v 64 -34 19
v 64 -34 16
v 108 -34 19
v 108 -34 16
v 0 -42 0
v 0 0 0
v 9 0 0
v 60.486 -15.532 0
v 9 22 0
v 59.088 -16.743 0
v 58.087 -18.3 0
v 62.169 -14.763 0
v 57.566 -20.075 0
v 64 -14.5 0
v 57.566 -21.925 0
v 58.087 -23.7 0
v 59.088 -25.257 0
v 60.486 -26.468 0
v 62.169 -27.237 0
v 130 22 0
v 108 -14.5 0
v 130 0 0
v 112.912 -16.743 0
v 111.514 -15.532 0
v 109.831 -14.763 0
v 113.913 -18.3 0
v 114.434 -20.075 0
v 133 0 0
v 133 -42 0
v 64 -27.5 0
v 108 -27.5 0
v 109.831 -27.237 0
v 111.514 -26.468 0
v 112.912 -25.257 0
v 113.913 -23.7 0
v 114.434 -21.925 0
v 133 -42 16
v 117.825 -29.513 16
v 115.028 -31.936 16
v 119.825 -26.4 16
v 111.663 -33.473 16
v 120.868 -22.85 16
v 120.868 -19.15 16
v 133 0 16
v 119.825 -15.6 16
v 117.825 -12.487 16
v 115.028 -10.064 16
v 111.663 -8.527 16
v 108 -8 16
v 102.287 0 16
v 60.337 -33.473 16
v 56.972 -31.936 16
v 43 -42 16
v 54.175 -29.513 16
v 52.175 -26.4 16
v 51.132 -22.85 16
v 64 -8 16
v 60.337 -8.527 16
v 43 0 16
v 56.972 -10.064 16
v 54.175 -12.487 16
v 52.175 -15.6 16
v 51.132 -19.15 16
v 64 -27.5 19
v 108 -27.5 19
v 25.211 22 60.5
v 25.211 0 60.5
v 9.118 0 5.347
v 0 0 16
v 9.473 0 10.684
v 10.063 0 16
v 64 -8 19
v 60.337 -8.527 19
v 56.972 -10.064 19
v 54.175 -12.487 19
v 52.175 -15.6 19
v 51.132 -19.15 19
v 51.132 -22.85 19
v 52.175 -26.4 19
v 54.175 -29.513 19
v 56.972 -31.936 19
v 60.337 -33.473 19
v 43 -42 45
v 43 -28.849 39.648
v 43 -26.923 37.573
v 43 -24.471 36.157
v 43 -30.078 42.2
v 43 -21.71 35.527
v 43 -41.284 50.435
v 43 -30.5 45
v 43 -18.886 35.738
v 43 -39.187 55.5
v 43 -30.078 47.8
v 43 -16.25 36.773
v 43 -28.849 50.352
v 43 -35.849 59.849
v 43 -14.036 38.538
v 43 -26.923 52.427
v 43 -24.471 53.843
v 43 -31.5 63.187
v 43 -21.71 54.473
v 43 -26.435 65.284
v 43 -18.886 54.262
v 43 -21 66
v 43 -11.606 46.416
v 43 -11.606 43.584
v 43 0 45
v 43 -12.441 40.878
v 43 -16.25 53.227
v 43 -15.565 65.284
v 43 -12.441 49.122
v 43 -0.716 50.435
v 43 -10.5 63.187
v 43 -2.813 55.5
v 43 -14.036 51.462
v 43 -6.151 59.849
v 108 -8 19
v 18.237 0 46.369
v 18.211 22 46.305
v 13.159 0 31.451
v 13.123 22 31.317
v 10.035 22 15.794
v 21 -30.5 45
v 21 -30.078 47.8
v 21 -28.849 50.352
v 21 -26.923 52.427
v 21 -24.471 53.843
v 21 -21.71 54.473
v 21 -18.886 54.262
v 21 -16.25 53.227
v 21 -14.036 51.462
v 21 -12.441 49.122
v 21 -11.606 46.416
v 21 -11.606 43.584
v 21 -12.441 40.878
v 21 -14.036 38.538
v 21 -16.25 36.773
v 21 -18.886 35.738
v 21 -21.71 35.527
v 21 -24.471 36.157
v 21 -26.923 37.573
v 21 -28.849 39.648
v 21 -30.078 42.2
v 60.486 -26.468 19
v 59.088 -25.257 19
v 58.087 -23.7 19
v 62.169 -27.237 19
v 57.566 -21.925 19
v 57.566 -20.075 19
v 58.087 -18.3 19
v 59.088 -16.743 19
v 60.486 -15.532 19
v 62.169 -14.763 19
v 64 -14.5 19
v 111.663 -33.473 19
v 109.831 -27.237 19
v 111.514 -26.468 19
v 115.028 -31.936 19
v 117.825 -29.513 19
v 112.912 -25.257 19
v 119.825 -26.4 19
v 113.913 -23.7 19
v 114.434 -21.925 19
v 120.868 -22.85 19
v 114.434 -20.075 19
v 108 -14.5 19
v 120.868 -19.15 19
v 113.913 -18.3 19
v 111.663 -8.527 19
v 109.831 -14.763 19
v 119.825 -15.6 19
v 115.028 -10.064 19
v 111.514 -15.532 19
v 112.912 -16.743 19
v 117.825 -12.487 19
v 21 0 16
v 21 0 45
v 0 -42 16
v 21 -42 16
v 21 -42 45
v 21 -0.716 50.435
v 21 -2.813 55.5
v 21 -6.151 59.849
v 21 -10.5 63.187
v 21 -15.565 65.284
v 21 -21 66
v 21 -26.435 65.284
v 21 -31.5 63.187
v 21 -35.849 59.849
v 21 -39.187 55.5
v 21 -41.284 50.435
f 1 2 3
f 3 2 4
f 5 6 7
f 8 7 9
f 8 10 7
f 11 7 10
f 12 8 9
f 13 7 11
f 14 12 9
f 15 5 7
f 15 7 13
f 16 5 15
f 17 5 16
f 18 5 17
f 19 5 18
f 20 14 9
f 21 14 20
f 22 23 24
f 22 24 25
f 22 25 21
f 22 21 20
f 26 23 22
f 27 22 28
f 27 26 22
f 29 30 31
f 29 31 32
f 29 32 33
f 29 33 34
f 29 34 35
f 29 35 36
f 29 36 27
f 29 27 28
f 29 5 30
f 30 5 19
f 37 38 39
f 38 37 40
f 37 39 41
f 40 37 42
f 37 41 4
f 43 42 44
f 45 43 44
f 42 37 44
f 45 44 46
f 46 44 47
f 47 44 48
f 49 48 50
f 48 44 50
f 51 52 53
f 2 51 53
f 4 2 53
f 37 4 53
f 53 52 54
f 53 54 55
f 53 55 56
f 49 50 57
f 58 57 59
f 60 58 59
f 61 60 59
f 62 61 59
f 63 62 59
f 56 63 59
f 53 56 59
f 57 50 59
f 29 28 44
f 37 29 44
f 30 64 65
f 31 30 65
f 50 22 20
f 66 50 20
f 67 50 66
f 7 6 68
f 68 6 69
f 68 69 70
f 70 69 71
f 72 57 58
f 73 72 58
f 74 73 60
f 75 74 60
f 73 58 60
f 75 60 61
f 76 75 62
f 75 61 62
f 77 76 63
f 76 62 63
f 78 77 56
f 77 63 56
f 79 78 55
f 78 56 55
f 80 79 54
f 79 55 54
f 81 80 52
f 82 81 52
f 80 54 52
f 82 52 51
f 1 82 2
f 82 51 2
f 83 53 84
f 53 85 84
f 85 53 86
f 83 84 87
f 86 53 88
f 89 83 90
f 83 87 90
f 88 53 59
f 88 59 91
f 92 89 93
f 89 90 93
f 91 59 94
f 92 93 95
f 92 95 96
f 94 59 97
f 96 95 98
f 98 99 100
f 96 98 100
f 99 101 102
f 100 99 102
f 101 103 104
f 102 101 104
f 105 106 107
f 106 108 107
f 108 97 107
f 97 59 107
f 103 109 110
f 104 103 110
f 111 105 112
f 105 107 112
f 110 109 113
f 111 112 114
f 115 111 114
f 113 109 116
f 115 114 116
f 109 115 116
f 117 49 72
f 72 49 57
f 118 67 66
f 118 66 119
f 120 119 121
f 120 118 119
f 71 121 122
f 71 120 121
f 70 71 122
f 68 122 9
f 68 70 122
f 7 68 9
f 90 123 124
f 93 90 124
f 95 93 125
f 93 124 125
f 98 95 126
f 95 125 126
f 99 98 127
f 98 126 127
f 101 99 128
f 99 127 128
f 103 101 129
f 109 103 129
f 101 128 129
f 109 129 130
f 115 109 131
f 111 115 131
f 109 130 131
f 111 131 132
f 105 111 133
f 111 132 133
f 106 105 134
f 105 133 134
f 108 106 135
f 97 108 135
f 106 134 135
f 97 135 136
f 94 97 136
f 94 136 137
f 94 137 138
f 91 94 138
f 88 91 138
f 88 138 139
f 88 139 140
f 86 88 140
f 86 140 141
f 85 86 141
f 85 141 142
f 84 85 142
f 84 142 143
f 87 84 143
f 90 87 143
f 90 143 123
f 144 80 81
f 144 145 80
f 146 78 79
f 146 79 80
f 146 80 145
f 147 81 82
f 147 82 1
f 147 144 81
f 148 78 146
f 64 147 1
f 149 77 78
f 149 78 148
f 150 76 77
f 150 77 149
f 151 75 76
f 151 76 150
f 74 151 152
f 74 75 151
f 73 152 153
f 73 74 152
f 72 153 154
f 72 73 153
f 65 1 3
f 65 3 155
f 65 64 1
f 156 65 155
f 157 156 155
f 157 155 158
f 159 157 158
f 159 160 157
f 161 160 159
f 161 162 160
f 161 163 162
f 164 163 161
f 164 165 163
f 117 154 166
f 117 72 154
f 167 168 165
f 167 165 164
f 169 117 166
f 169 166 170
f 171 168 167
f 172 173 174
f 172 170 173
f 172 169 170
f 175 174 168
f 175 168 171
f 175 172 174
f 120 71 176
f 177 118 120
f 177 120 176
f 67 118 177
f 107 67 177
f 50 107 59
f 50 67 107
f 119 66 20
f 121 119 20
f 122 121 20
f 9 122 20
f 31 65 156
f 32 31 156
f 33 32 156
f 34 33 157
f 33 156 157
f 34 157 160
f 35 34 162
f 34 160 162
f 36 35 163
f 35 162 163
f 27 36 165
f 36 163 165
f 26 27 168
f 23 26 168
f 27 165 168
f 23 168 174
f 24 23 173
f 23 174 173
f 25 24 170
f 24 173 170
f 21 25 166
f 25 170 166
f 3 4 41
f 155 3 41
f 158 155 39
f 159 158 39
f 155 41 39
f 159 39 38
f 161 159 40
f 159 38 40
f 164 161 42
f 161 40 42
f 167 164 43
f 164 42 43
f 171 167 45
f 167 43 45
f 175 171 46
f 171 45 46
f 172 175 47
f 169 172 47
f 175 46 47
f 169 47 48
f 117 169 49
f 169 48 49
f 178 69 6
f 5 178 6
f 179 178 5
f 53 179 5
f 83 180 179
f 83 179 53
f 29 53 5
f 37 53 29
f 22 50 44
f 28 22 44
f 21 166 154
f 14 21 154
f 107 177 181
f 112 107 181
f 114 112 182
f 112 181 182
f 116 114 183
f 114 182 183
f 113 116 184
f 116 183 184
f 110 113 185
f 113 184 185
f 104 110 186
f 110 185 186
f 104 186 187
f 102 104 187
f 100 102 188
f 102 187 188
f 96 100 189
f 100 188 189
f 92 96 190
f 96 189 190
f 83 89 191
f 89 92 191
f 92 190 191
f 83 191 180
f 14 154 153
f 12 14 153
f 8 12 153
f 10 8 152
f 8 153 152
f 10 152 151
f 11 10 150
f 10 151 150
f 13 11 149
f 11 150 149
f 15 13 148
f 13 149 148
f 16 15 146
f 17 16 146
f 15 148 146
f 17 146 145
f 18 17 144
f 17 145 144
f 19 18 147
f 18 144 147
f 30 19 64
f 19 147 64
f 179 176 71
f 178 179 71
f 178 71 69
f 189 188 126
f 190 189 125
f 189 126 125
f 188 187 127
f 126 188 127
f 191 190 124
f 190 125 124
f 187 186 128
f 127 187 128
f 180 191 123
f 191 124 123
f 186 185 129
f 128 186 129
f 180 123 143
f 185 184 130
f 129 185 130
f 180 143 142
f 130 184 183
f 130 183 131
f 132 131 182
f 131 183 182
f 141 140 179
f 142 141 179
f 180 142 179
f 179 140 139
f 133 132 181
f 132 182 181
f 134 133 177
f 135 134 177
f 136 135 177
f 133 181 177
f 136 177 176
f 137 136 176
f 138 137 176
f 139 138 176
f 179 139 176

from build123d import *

# Parameters (mm, degrees)
F1_DEPTH  = 42
F3_DEPTH  = 112.001
F4_R      = 9.5
F5_DEPTH  = 112.001
F7_DEPTH  = 3
F9_DEPTH  = 22
F11_DEPTH = 25


with BuildPart() as f1:
    # F0 (on Front) → F1 (new body)
    with BuildSketch(Plane.XZ):
        Polygon((0, 16), (0, 0), (133, 0), (133, 16), (43, 16), (43, 66), (21, 66), (21, 16), align=None)
    extrude(amount=F1_DEPTH)

    # F2 (on face) → F3 (cut, through all)
    with BuildSketch(Plane(origin=(21, 0, 0), x_dir=(0, -1, 0), z_dir=(-1, 0, 0))):
        with BuildLine():
            Line((0, 66), (0, 45))
            ThreePointArc((0, 45), (6.1507575951, 59.8492424049), (21, 66))
            Line((21, 66), (0, 66))
        make_face()
        with BuildLine():
            Line((42, 66), (21, 66))
            ThreePointArc((21, 66), (35.8492424049, 59.8492424049), (42, 45))
            Line((42, 45), (42, 66))
        make_face()
    extrude(amount=-F3_DEPTH, mode=Mode.SUBTRACT)

    # F4 (on face) → F5 (cut, through all)
    with BuildSketch(Plane(origin=(21, 0, 0), x_dir=(0, -1, 0), z_dir=(-1, 0, 0))):
        with Locations((21, 45)):
            Circle(F4_R)
    extrude(amount=-F5_DEPTH, mode=Mode.SUBTRACT)

    # F6 (on face) → F7 (join)
    with BuildSketch(Plane.XY.offset(16)):
        with BuildLine():
            Line((108, -8), (64, -8))
            ThreePointArc((64, -8), (51, -21), (64, -34))
            Line((64, -34), (108, -34))
            ThreePointArc((108, -34), (121, -21), (108, -8))
        make_face()
    extrude(amount=F7_DEPTH)

    # F8 (on Front) → F9 (join)
    with BuildSketch(Plane.XZ):
        with BuildLine():
            ThreePointArc((25.2109261421, 60.5), (13.122975019, 31.3171044574), (9, 0))
            Line((9, 0), (130, 0))
            Line((130, 0), (25.2109261421, 60.5))
        make_face()
    extrude(amount=-F9_DEPTH)

    # F10 (on face) → F11 (cut)
    with BuildSketch(Plane.XY.offset(19)):
        with BuildLine():
            Line((108, -14.5), (64, -14.5))
            ThreePointArc((64, -14.5), (57.5, -21), (64, -27.5))
            Line((64, -27.5), (108, -27.5))
            ThreePointArc((108, -27.5), (114.5, -21), (108, -14.5))
        make_face()
    extrude(amount=-F11_DEPTH, mode=Mode.SUBTRACT)


solid = f1.part
